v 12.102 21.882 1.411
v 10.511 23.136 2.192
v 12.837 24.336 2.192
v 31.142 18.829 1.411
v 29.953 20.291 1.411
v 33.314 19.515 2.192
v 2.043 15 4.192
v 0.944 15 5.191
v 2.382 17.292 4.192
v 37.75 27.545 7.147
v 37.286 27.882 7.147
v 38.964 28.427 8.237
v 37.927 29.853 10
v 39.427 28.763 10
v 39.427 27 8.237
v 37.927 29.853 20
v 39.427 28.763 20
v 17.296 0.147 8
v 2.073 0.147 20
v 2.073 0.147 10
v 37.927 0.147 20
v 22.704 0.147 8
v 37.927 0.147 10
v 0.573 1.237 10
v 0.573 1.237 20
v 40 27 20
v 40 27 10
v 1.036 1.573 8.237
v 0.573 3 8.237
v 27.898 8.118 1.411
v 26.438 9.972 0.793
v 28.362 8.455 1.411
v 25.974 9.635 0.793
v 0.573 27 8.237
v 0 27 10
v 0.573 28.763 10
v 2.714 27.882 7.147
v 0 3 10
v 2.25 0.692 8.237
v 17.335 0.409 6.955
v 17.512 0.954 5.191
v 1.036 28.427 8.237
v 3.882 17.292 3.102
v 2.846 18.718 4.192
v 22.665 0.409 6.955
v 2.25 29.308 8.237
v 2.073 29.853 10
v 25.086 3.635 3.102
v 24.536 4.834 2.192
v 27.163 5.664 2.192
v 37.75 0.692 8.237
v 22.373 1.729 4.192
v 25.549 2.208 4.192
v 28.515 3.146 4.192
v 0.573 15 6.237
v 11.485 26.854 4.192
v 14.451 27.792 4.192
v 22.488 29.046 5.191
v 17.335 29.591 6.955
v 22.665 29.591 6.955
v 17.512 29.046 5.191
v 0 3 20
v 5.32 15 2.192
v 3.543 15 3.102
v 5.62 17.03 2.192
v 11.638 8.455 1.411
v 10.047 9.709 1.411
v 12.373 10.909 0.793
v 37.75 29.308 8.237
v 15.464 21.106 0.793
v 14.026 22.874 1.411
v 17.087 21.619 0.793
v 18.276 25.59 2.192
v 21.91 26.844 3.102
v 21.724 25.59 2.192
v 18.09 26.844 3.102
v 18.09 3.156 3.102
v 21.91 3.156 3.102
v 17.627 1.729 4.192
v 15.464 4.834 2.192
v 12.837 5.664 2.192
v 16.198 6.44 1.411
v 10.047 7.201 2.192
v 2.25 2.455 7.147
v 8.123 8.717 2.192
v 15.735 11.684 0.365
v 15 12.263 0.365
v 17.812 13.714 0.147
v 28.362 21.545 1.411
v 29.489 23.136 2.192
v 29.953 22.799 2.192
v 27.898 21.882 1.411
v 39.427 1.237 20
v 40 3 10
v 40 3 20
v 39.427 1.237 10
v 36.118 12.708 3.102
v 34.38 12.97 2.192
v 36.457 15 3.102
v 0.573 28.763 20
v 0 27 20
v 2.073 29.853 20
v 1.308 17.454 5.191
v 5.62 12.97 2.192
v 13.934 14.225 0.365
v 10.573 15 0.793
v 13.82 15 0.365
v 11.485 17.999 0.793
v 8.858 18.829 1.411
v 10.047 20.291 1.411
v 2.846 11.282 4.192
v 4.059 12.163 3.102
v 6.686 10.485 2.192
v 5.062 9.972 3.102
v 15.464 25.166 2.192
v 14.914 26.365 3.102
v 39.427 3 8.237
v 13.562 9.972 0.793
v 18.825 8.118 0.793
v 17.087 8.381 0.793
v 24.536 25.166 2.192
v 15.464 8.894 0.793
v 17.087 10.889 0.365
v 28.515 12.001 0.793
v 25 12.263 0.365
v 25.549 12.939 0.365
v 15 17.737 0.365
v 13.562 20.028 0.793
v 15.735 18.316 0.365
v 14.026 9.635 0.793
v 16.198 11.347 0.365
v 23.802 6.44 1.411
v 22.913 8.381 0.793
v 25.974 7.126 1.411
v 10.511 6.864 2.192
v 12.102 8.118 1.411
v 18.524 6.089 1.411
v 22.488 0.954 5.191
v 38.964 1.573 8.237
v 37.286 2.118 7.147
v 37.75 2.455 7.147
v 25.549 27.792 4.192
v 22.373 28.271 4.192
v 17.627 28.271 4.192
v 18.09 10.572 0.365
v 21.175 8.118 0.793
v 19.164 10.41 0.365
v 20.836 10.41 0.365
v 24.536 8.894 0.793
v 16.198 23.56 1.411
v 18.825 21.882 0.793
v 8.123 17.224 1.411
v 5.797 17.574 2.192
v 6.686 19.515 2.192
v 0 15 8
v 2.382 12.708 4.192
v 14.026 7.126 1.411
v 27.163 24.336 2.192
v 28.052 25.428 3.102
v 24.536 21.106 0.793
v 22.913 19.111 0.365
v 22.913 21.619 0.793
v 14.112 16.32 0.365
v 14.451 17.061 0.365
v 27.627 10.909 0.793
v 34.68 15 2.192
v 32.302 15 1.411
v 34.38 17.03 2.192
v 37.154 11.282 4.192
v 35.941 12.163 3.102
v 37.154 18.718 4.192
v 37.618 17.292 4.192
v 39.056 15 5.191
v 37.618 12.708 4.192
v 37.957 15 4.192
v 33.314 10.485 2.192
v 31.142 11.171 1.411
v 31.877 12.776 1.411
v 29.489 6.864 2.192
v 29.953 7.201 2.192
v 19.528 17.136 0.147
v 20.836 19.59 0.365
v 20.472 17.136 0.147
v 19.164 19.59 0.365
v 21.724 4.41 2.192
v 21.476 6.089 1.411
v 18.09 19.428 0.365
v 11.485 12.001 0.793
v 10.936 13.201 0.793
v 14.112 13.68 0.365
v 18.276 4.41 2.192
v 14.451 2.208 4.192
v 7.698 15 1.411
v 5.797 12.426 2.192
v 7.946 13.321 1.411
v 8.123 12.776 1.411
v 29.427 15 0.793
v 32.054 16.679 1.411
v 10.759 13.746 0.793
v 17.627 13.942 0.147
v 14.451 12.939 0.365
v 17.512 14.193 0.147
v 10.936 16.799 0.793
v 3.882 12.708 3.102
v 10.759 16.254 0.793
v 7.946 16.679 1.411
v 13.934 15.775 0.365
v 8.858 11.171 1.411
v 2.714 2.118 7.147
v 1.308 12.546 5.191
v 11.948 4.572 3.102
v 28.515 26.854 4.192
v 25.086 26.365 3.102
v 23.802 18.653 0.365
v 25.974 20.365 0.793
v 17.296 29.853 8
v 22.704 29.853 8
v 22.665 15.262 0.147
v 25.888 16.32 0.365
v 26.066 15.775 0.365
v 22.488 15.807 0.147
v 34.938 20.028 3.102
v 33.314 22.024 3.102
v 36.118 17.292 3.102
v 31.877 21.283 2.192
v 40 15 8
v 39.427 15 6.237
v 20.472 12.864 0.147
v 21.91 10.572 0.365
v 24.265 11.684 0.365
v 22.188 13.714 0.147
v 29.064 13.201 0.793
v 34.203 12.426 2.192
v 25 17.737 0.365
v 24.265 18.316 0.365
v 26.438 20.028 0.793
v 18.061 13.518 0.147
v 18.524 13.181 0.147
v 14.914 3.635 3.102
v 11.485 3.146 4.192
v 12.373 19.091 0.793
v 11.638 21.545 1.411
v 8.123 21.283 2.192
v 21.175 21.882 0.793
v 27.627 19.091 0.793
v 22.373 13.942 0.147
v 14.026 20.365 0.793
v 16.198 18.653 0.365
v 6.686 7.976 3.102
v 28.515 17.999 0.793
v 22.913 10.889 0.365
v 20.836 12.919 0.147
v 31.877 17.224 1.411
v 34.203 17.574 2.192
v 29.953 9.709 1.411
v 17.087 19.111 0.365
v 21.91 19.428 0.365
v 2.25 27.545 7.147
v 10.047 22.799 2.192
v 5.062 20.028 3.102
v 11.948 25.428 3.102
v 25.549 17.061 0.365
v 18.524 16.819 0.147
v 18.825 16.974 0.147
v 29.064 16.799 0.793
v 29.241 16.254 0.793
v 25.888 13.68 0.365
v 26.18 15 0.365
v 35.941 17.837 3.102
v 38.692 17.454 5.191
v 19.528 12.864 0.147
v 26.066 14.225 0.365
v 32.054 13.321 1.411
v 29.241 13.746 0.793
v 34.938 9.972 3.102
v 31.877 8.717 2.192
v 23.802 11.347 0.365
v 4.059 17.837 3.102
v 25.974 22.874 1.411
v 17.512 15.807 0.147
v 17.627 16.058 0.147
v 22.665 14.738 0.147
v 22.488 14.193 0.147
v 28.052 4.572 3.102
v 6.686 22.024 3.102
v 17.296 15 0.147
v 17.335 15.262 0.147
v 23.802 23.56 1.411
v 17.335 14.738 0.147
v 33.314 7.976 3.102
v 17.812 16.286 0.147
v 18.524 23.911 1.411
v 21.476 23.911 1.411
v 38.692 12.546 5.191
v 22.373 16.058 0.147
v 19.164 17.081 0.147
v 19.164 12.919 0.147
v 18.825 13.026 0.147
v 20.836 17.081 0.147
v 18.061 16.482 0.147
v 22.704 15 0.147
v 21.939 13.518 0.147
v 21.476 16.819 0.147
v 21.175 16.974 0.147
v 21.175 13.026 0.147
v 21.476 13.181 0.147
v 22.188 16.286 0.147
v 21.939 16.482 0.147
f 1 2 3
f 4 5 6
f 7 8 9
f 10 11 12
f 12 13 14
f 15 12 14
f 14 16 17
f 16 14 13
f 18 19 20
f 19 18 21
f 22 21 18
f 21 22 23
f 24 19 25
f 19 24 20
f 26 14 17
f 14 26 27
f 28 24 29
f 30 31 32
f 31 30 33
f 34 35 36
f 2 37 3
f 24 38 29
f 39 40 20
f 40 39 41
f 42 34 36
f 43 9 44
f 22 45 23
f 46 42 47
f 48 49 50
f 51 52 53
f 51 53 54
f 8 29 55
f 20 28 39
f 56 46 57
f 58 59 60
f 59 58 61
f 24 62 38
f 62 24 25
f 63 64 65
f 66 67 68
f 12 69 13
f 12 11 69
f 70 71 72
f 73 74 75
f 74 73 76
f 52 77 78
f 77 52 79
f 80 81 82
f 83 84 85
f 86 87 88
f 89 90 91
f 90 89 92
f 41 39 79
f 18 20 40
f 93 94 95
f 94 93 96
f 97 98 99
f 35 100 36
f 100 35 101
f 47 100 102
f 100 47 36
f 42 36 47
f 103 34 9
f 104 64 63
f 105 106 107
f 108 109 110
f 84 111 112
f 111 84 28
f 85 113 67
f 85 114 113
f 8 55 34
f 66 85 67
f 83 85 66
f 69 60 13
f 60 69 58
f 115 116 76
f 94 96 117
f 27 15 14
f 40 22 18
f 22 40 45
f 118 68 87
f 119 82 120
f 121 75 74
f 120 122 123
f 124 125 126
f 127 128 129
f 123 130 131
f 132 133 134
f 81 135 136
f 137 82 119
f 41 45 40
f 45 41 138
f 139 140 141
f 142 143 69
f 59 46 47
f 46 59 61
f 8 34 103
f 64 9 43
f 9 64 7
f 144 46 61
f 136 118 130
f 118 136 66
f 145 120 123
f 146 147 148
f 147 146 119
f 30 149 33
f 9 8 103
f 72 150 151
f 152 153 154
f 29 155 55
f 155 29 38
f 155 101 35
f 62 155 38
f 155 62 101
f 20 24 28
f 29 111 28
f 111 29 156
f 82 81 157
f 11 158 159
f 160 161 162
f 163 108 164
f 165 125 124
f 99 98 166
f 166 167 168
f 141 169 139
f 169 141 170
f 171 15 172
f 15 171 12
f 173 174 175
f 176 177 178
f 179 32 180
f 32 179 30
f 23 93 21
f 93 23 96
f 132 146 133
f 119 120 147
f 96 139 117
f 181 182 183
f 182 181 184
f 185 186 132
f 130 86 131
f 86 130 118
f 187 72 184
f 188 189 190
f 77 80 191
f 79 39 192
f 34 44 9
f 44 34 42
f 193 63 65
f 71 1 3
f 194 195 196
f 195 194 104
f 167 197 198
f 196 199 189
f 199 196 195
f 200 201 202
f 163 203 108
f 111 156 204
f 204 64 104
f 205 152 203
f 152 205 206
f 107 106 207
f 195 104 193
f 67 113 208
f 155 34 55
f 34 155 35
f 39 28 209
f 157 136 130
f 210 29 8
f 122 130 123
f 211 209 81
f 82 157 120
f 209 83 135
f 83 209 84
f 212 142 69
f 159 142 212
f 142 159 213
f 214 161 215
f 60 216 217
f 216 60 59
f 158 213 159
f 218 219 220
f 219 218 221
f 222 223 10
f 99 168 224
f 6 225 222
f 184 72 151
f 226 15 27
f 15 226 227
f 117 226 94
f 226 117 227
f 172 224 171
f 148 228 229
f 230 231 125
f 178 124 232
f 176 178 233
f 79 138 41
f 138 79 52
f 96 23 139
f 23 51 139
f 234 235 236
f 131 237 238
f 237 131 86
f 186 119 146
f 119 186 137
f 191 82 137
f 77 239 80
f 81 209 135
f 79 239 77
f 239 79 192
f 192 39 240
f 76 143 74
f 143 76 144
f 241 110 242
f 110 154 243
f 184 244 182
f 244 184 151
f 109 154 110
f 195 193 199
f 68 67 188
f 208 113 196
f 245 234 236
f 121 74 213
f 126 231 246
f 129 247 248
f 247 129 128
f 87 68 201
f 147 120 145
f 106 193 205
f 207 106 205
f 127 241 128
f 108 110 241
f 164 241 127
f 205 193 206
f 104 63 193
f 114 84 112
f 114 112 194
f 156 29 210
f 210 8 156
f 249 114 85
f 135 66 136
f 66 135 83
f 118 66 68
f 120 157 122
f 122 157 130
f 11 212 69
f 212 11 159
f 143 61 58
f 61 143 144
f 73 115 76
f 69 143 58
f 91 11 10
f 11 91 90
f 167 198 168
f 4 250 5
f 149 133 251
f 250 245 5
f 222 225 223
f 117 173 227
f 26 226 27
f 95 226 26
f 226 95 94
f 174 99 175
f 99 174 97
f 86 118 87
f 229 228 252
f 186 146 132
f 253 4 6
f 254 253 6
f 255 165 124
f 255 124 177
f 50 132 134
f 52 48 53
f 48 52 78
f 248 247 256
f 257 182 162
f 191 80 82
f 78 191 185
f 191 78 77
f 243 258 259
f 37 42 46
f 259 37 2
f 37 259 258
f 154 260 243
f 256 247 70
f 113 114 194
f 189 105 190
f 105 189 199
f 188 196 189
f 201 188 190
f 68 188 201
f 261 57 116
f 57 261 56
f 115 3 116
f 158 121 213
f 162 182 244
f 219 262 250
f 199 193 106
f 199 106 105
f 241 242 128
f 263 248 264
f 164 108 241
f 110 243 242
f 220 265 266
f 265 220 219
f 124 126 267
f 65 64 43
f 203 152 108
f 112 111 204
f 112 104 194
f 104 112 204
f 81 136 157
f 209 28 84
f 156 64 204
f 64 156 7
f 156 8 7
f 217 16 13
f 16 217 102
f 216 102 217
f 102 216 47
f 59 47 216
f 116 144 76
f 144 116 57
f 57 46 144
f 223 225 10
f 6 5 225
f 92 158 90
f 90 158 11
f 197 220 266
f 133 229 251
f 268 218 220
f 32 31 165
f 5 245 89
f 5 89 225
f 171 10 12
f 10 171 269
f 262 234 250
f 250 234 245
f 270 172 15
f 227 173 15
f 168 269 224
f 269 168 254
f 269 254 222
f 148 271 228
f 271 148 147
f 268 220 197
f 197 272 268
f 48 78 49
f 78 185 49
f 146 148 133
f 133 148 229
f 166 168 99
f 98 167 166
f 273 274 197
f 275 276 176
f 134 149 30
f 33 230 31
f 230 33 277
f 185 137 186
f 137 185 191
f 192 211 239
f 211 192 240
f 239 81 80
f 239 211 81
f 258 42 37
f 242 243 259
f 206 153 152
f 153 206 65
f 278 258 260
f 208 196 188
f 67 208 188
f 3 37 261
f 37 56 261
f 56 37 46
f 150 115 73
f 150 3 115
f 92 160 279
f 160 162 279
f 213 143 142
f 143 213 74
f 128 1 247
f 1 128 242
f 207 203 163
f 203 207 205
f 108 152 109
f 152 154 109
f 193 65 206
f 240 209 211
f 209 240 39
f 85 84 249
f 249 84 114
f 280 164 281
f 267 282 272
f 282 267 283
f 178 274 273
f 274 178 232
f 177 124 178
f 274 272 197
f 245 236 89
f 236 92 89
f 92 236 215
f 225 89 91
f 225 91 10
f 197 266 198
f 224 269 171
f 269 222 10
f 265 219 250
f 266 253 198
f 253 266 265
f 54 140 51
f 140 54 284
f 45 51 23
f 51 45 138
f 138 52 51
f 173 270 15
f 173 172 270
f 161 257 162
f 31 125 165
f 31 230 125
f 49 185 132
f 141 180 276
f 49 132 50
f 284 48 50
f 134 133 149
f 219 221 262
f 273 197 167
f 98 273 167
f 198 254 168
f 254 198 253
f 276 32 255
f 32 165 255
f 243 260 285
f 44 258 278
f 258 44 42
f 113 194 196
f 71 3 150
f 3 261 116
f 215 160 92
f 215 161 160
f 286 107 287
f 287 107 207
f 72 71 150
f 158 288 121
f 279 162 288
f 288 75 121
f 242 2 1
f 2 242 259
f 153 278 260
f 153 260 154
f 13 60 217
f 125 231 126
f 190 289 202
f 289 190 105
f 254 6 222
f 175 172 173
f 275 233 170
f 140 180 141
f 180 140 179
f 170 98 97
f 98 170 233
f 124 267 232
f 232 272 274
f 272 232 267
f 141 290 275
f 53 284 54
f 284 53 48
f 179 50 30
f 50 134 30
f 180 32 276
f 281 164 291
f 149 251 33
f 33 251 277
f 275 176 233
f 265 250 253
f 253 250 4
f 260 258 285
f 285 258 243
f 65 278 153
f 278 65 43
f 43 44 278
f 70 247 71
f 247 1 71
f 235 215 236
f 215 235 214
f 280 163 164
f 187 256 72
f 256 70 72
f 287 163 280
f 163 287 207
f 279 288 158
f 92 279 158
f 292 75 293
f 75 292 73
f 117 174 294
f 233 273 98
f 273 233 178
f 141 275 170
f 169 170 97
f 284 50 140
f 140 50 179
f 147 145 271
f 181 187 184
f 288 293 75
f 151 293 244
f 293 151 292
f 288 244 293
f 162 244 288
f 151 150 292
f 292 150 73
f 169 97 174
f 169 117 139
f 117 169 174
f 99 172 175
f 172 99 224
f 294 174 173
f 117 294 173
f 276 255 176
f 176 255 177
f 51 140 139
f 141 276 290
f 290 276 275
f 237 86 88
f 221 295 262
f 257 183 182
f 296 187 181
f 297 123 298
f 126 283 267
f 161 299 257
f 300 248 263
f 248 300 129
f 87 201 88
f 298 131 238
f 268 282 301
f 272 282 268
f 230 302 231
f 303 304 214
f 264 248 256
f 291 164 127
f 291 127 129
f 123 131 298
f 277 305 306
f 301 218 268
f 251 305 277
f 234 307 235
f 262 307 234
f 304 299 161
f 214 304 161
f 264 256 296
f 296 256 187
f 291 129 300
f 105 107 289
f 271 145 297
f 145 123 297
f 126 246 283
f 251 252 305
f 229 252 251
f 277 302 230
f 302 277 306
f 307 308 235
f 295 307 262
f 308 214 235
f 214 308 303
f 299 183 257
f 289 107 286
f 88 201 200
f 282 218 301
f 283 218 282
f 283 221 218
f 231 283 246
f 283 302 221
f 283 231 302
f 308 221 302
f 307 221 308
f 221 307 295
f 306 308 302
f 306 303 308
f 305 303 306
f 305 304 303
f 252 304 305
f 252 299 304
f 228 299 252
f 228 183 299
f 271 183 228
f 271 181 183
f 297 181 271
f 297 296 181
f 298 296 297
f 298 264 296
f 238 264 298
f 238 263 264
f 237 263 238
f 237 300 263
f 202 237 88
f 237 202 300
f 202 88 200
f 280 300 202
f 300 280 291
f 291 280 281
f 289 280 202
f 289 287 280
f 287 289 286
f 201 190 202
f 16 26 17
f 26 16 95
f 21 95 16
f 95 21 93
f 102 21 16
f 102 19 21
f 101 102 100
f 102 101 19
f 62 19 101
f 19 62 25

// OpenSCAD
// file: ../dish.scad
$rounding = 3;
$bleed = 1;

module dish (size) {
  width = size[0];
  length = size[1];
  height = size[2];

  r_width = width - $rounding * 2;
  r_length = length - $rounding * 2;
  r_height = height - $rounding * 2;

  radius = min(r_width,r_length);

  difference() {
    translate([$rounding,$rounding,$rounding]) {
      minkowski() {
        hull() {
          translate([0,0,r_height/2]) {
            cube([r_width,r_length,height/2]);
          }
          translate([r_width/2,r_length/2,height/4]) {
            resize([r_width,r_length,height/2]) {
              sphere(radius);
            }
          }
        }
        sphere($rounding);
      }
    }

    translate([-$bleed,-$bleed,height]) {
      cube([
        width + $bleed * 2,
        length + $bleed * 2,
        $rounding + $bleed
      ]);
    }
  }
}
// main file
echo(version=version());

include <../../lib/dish.scad>

dish([40, 30, 20]);
